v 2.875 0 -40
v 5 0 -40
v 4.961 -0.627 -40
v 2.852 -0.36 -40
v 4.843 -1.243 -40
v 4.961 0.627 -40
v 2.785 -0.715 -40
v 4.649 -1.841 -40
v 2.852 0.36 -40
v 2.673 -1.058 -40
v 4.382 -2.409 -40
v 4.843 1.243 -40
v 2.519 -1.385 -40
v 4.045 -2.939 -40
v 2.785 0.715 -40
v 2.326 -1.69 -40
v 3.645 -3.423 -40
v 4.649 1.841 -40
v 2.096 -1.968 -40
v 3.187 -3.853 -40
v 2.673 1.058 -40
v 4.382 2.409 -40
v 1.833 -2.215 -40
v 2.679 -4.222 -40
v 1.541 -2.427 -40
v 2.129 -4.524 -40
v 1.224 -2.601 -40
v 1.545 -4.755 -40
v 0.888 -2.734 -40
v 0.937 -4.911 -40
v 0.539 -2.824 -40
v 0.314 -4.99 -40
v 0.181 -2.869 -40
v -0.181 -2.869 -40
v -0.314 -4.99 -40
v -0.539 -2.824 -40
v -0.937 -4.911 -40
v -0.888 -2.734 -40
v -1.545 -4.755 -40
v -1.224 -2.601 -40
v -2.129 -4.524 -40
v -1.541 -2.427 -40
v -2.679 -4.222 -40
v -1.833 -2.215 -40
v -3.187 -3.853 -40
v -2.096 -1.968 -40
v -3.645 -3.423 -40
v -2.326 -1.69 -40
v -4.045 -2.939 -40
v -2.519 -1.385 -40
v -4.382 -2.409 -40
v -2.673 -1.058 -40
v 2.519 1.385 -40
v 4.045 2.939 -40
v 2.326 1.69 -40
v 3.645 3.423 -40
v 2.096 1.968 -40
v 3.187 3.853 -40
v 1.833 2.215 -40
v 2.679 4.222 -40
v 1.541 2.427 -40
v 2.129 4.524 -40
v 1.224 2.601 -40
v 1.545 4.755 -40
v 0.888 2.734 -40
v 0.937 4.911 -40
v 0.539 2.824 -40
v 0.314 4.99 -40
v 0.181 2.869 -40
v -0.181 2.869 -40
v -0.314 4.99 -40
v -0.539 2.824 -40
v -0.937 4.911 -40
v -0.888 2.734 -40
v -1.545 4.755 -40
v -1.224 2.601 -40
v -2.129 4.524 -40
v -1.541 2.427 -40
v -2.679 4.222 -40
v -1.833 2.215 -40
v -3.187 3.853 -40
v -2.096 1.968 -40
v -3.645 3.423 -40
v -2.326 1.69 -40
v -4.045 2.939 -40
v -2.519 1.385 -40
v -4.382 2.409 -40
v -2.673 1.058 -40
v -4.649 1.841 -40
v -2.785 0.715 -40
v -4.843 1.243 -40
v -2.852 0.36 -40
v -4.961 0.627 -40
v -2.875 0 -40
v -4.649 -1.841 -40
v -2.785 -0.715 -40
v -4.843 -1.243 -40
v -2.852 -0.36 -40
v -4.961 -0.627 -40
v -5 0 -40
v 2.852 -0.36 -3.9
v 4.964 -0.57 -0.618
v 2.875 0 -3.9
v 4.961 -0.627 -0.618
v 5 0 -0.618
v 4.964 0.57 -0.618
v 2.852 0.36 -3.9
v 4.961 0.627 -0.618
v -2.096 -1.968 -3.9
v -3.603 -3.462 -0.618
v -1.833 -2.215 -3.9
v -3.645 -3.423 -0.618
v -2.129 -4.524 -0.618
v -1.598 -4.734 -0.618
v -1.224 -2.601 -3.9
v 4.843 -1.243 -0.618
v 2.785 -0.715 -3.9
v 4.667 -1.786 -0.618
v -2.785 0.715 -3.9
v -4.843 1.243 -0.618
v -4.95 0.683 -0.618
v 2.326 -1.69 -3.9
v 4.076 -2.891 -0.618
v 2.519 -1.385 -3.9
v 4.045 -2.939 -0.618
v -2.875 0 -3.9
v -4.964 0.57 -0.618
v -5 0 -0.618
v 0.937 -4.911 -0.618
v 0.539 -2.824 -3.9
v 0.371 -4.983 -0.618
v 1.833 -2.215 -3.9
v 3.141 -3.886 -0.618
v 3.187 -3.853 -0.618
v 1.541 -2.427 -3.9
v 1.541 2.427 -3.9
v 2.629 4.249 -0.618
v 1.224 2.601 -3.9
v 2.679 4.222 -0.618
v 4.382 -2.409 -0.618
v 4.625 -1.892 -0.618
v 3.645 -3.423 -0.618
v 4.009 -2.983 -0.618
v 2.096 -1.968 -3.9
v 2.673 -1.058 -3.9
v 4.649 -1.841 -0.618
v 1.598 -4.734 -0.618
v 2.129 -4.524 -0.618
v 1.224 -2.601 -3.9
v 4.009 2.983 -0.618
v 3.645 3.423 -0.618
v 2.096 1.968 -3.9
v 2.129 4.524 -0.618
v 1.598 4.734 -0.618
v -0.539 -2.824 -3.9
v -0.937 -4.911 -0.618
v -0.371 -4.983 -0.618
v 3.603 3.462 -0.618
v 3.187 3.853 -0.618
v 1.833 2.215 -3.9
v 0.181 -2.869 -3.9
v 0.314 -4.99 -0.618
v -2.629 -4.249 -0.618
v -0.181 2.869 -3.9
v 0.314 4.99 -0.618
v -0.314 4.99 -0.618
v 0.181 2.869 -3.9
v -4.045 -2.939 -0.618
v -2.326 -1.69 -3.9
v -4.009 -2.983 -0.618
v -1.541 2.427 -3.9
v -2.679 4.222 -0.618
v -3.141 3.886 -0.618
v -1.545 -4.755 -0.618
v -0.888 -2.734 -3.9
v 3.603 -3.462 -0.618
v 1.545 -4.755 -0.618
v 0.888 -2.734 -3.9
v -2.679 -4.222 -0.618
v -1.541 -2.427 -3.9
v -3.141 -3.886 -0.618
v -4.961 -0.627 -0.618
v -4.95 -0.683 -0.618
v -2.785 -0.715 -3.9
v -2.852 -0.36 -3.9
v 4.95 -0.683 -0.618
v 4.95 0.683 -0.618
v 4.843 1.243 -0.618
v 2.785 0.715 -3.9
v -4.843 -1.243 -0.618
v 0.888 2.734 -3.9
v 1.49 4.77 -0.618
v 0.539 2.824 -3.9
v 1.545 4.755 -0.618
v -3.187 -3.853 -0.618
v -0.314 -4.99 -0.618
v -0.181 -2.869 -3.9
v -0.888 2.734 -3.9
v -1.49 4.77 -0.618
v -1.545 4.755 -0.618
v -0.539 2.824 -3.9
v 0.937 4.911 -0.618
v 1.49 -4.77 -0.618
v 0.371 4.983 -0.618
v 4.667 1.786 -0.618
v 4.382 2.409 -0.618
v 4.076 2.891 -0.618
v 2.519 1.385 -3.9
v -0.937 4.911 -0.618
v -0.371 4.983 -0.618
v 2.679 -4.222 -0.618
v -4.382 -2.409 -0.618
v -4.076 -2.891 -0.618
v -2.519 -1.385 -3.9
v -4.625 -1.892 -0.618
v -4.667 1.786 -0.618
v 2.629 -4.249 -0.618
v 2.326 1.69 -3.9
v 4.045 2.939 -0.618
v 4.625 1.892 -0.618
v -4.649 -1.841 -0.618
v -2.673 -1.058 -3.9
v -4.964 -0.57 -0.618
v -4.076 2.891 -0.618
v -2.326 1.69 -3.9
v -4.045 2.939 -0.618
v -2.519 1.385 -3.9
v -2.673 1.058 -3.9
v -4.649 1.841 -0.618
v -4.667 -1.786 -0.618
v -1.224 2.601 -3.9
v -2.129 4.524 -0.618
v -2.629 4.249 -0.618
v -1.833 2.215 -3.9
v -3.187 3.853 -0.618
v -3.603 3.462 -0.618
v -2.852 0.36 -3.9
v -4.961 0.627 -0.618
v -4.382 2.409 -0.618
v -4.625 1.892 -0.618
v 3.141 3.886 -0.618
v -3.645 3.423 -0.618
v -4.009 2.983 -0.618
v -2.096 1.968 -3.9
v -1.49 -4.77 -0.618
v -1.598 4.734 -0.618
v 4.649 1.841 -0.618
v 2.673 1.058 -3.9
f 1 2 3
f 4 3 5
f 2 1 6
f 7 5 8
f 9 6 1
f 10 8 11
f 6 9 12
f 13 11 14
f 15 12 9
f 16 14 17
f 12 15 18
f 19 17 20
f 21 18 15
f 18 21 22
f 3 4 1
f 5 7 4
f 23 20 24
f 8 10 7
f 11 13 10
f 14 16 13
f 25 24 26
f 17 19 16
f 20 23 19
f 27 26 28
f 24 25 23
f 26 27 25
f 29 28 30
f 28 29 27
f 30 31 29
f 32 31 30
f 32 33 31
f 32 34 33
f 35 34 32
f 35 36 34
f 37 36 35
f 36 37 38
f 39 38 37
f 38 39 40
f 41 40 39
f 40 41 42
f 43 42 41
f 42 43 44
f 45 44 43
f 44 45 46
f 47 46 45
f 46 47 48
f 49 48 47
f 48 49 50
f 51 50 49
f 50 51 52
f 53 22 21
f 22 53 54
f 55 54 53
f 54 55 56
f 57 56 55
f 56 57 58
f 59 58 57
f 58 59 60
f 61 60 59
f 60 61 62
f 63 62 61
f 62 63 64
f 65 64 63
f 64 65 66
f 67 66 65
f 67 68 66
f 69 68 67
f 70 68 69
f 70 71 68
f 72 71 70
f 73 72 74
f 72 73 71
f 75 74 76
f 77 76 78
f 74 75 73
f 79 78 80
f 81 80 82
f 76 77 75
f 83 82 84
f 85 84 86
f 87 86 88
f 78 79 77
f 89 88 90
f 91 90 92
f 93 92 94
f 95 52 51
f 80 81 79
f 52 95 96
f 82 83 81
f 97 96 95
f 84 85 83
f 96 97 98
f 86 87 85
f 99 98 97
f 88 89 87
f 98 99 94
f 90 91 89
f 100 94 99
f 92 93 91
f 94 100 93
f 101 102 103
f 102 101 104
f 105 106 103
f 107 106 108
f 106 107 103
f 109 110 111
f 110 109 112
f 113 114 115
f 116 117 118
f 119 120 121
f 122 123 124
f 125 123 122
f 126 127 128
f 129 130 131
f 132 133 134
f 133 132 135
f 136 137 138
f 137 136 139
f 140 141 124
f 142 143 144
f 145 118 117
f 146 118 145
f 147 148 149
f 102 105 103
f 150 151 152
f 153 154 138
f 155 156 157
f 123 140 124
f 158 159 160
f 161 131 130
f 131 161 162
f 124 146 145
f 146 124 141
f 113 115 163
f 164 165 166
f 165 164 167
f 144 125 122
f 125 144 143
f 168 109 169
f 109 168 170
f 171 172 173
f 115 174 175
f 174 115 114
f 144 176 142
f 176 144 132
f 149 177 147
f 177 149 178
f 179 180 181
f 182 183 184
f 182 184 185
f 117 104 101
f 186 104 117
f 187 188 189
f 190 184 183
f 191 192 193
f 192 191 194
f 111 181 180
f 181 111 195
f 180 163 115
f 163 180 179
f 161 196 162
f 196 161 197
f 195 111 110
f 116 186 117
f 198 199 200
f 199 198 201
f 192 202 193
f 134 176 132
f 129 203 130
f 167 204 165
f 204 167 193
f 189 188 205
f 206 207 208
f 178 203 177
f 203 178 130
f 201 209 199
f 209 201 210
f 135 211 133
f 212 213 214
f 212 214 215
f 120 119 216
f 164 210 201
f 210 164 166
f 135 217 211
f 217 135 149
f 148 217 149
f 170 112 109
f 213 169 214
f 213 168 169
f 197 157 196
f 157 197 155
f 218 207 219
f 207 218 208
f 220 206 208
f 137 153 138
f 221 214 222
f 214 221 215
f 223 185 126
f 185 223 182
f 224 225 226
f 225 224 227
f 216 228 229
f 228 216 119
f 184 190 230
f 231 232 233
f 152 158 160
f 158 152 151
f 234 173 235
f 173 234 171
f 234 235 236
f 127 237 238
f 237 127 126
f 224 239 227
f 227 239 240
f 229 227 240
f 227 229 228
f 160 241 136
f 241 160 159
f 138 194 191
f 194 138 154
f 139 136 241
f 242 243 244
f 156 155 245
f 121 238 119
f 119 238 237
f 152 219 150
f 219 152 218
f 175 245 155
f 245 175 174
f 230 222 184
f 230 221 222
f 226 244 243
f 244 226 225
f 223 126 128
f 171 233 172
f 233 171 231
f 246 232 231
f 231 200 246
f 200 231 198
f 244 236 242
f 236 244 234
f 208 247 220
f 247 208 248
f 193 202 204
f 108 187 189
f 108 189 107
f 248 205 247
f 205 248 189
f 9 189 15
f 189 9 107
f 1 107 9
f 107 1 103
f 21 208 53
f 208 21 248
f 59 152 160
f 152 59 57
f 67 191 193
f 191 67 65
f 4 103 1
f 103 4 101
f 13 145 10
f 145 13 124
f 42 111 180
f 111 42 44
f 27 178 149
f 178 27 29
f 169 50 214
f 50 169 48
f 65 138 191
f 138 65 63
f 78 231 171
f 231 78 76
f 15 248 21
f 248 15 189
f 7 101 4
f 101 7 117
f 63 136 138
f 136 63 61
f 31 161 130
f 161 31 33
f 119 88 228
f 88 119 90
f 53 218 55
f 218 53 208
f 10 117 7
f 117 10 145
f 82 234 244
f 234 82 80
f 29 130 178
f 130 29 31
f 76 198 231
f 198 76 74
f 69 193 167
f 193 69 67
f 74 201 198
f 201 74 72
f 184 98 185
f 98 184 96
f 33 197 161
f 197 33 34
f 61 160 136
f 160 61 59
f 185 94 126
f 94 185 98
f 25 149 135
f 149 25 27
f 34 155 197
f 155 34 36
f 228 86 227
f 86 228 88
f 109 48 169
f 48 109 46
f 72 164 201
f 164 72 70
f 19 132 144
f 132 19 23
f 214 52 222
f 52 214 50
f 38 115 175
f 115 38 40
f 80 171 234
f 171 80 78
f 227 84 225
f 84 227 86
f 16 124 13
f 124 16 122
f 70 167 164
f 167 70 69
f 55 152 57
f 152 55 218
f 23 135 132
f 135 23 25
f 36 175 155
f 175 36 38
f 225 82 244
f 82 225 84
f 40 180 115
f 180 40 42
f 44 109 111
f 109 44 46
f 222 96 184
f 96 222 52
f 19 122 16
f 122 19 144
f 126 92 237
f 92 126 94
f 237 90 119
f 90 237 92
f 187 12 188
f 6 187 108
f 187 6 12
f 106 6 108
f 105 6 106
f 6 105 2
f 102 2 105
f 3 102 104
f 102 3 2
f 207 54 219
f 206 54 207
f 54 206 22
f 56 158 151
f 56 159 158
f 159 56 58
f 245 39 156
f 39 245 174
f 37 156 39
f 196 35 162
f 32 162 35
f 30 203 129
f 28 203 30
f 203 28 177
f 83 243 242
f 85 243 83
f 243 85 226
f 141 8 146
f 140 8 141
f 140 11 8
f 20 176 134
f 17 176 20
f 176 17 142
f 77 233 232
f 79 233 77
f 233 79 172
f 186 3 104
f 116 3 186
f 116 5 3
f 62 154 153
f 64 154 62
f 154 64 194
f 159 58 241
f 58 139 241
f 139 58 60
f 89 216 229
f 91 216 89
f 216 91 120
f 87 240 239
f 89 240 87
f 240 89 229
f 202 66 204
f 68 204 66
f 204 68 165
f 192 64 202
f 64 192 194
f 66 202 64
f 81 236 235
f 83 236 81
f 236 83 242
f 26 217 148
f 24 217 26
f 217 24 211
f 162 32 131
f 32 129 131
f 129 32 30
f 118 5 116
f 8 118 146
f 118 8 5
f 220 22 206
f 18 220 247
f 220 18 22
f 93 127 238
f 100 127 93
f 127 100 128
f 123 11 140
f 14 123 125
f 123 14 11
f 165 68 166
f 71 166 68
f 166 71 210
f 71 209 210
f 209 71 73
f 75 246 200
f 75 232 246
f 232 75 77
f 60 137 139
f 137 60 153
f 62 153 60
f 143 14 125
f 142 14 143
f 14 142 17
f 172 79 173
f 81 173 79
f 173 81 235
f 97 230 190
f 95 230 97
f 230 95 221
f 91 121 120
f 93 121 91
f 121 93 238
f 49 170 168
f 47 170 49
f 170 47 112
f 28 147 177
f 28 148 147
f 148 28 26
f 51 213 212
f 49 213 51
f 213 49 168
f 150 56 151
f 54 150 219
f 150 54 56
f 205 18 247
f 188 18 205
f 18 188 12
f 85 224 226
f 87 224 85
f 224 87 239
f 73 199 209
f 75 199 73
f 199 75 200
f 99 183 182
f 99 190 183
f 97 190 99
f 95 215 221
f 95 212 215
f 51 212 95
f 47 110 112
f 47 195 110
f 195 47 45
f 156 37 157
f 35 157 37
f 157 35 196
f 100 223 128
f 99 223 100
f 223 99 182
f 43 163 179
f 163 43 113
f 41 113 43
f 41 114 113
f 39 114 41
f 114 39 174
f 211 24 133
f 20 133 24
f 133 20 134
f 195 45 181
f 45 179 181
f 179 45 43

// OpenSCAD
$fn = 50;


difference() {
	union() {
		translate(v = [0, 0, -40.0000000000]) {
			cylinder(h = 40, r = 5.0000000000);
		}
		cylinder(h = 0, r = 8.0000000000);
	}
	union() {
		translate(v = [0, 0, 0]) {
			rotate(a = [0, 0, 0]) {
				difference() {
					union() {
						#translate(v = [0, 0, -40.0000000000]) {
							cylinder(h = 40, r = 2.6000000000);
						}
						#translate(v = [0, 0, -3.9000000000]) {
							cylinder(h = 3.9000000000, r = 5.0000000000, r1 = 2.8750000000, r2 = 5.4000000000);
						}
						#translate(v = [0, 0, -40.0000000000]) {
							cylinder(h = 40, r = 2.8750000000);
						}
						#translate(v = [0, 0, -40.0000000000]) {
							cylinder(h = 40, r = 2.6000000000);
						}
					}
					union();
				}
			}
		}
	}
}
